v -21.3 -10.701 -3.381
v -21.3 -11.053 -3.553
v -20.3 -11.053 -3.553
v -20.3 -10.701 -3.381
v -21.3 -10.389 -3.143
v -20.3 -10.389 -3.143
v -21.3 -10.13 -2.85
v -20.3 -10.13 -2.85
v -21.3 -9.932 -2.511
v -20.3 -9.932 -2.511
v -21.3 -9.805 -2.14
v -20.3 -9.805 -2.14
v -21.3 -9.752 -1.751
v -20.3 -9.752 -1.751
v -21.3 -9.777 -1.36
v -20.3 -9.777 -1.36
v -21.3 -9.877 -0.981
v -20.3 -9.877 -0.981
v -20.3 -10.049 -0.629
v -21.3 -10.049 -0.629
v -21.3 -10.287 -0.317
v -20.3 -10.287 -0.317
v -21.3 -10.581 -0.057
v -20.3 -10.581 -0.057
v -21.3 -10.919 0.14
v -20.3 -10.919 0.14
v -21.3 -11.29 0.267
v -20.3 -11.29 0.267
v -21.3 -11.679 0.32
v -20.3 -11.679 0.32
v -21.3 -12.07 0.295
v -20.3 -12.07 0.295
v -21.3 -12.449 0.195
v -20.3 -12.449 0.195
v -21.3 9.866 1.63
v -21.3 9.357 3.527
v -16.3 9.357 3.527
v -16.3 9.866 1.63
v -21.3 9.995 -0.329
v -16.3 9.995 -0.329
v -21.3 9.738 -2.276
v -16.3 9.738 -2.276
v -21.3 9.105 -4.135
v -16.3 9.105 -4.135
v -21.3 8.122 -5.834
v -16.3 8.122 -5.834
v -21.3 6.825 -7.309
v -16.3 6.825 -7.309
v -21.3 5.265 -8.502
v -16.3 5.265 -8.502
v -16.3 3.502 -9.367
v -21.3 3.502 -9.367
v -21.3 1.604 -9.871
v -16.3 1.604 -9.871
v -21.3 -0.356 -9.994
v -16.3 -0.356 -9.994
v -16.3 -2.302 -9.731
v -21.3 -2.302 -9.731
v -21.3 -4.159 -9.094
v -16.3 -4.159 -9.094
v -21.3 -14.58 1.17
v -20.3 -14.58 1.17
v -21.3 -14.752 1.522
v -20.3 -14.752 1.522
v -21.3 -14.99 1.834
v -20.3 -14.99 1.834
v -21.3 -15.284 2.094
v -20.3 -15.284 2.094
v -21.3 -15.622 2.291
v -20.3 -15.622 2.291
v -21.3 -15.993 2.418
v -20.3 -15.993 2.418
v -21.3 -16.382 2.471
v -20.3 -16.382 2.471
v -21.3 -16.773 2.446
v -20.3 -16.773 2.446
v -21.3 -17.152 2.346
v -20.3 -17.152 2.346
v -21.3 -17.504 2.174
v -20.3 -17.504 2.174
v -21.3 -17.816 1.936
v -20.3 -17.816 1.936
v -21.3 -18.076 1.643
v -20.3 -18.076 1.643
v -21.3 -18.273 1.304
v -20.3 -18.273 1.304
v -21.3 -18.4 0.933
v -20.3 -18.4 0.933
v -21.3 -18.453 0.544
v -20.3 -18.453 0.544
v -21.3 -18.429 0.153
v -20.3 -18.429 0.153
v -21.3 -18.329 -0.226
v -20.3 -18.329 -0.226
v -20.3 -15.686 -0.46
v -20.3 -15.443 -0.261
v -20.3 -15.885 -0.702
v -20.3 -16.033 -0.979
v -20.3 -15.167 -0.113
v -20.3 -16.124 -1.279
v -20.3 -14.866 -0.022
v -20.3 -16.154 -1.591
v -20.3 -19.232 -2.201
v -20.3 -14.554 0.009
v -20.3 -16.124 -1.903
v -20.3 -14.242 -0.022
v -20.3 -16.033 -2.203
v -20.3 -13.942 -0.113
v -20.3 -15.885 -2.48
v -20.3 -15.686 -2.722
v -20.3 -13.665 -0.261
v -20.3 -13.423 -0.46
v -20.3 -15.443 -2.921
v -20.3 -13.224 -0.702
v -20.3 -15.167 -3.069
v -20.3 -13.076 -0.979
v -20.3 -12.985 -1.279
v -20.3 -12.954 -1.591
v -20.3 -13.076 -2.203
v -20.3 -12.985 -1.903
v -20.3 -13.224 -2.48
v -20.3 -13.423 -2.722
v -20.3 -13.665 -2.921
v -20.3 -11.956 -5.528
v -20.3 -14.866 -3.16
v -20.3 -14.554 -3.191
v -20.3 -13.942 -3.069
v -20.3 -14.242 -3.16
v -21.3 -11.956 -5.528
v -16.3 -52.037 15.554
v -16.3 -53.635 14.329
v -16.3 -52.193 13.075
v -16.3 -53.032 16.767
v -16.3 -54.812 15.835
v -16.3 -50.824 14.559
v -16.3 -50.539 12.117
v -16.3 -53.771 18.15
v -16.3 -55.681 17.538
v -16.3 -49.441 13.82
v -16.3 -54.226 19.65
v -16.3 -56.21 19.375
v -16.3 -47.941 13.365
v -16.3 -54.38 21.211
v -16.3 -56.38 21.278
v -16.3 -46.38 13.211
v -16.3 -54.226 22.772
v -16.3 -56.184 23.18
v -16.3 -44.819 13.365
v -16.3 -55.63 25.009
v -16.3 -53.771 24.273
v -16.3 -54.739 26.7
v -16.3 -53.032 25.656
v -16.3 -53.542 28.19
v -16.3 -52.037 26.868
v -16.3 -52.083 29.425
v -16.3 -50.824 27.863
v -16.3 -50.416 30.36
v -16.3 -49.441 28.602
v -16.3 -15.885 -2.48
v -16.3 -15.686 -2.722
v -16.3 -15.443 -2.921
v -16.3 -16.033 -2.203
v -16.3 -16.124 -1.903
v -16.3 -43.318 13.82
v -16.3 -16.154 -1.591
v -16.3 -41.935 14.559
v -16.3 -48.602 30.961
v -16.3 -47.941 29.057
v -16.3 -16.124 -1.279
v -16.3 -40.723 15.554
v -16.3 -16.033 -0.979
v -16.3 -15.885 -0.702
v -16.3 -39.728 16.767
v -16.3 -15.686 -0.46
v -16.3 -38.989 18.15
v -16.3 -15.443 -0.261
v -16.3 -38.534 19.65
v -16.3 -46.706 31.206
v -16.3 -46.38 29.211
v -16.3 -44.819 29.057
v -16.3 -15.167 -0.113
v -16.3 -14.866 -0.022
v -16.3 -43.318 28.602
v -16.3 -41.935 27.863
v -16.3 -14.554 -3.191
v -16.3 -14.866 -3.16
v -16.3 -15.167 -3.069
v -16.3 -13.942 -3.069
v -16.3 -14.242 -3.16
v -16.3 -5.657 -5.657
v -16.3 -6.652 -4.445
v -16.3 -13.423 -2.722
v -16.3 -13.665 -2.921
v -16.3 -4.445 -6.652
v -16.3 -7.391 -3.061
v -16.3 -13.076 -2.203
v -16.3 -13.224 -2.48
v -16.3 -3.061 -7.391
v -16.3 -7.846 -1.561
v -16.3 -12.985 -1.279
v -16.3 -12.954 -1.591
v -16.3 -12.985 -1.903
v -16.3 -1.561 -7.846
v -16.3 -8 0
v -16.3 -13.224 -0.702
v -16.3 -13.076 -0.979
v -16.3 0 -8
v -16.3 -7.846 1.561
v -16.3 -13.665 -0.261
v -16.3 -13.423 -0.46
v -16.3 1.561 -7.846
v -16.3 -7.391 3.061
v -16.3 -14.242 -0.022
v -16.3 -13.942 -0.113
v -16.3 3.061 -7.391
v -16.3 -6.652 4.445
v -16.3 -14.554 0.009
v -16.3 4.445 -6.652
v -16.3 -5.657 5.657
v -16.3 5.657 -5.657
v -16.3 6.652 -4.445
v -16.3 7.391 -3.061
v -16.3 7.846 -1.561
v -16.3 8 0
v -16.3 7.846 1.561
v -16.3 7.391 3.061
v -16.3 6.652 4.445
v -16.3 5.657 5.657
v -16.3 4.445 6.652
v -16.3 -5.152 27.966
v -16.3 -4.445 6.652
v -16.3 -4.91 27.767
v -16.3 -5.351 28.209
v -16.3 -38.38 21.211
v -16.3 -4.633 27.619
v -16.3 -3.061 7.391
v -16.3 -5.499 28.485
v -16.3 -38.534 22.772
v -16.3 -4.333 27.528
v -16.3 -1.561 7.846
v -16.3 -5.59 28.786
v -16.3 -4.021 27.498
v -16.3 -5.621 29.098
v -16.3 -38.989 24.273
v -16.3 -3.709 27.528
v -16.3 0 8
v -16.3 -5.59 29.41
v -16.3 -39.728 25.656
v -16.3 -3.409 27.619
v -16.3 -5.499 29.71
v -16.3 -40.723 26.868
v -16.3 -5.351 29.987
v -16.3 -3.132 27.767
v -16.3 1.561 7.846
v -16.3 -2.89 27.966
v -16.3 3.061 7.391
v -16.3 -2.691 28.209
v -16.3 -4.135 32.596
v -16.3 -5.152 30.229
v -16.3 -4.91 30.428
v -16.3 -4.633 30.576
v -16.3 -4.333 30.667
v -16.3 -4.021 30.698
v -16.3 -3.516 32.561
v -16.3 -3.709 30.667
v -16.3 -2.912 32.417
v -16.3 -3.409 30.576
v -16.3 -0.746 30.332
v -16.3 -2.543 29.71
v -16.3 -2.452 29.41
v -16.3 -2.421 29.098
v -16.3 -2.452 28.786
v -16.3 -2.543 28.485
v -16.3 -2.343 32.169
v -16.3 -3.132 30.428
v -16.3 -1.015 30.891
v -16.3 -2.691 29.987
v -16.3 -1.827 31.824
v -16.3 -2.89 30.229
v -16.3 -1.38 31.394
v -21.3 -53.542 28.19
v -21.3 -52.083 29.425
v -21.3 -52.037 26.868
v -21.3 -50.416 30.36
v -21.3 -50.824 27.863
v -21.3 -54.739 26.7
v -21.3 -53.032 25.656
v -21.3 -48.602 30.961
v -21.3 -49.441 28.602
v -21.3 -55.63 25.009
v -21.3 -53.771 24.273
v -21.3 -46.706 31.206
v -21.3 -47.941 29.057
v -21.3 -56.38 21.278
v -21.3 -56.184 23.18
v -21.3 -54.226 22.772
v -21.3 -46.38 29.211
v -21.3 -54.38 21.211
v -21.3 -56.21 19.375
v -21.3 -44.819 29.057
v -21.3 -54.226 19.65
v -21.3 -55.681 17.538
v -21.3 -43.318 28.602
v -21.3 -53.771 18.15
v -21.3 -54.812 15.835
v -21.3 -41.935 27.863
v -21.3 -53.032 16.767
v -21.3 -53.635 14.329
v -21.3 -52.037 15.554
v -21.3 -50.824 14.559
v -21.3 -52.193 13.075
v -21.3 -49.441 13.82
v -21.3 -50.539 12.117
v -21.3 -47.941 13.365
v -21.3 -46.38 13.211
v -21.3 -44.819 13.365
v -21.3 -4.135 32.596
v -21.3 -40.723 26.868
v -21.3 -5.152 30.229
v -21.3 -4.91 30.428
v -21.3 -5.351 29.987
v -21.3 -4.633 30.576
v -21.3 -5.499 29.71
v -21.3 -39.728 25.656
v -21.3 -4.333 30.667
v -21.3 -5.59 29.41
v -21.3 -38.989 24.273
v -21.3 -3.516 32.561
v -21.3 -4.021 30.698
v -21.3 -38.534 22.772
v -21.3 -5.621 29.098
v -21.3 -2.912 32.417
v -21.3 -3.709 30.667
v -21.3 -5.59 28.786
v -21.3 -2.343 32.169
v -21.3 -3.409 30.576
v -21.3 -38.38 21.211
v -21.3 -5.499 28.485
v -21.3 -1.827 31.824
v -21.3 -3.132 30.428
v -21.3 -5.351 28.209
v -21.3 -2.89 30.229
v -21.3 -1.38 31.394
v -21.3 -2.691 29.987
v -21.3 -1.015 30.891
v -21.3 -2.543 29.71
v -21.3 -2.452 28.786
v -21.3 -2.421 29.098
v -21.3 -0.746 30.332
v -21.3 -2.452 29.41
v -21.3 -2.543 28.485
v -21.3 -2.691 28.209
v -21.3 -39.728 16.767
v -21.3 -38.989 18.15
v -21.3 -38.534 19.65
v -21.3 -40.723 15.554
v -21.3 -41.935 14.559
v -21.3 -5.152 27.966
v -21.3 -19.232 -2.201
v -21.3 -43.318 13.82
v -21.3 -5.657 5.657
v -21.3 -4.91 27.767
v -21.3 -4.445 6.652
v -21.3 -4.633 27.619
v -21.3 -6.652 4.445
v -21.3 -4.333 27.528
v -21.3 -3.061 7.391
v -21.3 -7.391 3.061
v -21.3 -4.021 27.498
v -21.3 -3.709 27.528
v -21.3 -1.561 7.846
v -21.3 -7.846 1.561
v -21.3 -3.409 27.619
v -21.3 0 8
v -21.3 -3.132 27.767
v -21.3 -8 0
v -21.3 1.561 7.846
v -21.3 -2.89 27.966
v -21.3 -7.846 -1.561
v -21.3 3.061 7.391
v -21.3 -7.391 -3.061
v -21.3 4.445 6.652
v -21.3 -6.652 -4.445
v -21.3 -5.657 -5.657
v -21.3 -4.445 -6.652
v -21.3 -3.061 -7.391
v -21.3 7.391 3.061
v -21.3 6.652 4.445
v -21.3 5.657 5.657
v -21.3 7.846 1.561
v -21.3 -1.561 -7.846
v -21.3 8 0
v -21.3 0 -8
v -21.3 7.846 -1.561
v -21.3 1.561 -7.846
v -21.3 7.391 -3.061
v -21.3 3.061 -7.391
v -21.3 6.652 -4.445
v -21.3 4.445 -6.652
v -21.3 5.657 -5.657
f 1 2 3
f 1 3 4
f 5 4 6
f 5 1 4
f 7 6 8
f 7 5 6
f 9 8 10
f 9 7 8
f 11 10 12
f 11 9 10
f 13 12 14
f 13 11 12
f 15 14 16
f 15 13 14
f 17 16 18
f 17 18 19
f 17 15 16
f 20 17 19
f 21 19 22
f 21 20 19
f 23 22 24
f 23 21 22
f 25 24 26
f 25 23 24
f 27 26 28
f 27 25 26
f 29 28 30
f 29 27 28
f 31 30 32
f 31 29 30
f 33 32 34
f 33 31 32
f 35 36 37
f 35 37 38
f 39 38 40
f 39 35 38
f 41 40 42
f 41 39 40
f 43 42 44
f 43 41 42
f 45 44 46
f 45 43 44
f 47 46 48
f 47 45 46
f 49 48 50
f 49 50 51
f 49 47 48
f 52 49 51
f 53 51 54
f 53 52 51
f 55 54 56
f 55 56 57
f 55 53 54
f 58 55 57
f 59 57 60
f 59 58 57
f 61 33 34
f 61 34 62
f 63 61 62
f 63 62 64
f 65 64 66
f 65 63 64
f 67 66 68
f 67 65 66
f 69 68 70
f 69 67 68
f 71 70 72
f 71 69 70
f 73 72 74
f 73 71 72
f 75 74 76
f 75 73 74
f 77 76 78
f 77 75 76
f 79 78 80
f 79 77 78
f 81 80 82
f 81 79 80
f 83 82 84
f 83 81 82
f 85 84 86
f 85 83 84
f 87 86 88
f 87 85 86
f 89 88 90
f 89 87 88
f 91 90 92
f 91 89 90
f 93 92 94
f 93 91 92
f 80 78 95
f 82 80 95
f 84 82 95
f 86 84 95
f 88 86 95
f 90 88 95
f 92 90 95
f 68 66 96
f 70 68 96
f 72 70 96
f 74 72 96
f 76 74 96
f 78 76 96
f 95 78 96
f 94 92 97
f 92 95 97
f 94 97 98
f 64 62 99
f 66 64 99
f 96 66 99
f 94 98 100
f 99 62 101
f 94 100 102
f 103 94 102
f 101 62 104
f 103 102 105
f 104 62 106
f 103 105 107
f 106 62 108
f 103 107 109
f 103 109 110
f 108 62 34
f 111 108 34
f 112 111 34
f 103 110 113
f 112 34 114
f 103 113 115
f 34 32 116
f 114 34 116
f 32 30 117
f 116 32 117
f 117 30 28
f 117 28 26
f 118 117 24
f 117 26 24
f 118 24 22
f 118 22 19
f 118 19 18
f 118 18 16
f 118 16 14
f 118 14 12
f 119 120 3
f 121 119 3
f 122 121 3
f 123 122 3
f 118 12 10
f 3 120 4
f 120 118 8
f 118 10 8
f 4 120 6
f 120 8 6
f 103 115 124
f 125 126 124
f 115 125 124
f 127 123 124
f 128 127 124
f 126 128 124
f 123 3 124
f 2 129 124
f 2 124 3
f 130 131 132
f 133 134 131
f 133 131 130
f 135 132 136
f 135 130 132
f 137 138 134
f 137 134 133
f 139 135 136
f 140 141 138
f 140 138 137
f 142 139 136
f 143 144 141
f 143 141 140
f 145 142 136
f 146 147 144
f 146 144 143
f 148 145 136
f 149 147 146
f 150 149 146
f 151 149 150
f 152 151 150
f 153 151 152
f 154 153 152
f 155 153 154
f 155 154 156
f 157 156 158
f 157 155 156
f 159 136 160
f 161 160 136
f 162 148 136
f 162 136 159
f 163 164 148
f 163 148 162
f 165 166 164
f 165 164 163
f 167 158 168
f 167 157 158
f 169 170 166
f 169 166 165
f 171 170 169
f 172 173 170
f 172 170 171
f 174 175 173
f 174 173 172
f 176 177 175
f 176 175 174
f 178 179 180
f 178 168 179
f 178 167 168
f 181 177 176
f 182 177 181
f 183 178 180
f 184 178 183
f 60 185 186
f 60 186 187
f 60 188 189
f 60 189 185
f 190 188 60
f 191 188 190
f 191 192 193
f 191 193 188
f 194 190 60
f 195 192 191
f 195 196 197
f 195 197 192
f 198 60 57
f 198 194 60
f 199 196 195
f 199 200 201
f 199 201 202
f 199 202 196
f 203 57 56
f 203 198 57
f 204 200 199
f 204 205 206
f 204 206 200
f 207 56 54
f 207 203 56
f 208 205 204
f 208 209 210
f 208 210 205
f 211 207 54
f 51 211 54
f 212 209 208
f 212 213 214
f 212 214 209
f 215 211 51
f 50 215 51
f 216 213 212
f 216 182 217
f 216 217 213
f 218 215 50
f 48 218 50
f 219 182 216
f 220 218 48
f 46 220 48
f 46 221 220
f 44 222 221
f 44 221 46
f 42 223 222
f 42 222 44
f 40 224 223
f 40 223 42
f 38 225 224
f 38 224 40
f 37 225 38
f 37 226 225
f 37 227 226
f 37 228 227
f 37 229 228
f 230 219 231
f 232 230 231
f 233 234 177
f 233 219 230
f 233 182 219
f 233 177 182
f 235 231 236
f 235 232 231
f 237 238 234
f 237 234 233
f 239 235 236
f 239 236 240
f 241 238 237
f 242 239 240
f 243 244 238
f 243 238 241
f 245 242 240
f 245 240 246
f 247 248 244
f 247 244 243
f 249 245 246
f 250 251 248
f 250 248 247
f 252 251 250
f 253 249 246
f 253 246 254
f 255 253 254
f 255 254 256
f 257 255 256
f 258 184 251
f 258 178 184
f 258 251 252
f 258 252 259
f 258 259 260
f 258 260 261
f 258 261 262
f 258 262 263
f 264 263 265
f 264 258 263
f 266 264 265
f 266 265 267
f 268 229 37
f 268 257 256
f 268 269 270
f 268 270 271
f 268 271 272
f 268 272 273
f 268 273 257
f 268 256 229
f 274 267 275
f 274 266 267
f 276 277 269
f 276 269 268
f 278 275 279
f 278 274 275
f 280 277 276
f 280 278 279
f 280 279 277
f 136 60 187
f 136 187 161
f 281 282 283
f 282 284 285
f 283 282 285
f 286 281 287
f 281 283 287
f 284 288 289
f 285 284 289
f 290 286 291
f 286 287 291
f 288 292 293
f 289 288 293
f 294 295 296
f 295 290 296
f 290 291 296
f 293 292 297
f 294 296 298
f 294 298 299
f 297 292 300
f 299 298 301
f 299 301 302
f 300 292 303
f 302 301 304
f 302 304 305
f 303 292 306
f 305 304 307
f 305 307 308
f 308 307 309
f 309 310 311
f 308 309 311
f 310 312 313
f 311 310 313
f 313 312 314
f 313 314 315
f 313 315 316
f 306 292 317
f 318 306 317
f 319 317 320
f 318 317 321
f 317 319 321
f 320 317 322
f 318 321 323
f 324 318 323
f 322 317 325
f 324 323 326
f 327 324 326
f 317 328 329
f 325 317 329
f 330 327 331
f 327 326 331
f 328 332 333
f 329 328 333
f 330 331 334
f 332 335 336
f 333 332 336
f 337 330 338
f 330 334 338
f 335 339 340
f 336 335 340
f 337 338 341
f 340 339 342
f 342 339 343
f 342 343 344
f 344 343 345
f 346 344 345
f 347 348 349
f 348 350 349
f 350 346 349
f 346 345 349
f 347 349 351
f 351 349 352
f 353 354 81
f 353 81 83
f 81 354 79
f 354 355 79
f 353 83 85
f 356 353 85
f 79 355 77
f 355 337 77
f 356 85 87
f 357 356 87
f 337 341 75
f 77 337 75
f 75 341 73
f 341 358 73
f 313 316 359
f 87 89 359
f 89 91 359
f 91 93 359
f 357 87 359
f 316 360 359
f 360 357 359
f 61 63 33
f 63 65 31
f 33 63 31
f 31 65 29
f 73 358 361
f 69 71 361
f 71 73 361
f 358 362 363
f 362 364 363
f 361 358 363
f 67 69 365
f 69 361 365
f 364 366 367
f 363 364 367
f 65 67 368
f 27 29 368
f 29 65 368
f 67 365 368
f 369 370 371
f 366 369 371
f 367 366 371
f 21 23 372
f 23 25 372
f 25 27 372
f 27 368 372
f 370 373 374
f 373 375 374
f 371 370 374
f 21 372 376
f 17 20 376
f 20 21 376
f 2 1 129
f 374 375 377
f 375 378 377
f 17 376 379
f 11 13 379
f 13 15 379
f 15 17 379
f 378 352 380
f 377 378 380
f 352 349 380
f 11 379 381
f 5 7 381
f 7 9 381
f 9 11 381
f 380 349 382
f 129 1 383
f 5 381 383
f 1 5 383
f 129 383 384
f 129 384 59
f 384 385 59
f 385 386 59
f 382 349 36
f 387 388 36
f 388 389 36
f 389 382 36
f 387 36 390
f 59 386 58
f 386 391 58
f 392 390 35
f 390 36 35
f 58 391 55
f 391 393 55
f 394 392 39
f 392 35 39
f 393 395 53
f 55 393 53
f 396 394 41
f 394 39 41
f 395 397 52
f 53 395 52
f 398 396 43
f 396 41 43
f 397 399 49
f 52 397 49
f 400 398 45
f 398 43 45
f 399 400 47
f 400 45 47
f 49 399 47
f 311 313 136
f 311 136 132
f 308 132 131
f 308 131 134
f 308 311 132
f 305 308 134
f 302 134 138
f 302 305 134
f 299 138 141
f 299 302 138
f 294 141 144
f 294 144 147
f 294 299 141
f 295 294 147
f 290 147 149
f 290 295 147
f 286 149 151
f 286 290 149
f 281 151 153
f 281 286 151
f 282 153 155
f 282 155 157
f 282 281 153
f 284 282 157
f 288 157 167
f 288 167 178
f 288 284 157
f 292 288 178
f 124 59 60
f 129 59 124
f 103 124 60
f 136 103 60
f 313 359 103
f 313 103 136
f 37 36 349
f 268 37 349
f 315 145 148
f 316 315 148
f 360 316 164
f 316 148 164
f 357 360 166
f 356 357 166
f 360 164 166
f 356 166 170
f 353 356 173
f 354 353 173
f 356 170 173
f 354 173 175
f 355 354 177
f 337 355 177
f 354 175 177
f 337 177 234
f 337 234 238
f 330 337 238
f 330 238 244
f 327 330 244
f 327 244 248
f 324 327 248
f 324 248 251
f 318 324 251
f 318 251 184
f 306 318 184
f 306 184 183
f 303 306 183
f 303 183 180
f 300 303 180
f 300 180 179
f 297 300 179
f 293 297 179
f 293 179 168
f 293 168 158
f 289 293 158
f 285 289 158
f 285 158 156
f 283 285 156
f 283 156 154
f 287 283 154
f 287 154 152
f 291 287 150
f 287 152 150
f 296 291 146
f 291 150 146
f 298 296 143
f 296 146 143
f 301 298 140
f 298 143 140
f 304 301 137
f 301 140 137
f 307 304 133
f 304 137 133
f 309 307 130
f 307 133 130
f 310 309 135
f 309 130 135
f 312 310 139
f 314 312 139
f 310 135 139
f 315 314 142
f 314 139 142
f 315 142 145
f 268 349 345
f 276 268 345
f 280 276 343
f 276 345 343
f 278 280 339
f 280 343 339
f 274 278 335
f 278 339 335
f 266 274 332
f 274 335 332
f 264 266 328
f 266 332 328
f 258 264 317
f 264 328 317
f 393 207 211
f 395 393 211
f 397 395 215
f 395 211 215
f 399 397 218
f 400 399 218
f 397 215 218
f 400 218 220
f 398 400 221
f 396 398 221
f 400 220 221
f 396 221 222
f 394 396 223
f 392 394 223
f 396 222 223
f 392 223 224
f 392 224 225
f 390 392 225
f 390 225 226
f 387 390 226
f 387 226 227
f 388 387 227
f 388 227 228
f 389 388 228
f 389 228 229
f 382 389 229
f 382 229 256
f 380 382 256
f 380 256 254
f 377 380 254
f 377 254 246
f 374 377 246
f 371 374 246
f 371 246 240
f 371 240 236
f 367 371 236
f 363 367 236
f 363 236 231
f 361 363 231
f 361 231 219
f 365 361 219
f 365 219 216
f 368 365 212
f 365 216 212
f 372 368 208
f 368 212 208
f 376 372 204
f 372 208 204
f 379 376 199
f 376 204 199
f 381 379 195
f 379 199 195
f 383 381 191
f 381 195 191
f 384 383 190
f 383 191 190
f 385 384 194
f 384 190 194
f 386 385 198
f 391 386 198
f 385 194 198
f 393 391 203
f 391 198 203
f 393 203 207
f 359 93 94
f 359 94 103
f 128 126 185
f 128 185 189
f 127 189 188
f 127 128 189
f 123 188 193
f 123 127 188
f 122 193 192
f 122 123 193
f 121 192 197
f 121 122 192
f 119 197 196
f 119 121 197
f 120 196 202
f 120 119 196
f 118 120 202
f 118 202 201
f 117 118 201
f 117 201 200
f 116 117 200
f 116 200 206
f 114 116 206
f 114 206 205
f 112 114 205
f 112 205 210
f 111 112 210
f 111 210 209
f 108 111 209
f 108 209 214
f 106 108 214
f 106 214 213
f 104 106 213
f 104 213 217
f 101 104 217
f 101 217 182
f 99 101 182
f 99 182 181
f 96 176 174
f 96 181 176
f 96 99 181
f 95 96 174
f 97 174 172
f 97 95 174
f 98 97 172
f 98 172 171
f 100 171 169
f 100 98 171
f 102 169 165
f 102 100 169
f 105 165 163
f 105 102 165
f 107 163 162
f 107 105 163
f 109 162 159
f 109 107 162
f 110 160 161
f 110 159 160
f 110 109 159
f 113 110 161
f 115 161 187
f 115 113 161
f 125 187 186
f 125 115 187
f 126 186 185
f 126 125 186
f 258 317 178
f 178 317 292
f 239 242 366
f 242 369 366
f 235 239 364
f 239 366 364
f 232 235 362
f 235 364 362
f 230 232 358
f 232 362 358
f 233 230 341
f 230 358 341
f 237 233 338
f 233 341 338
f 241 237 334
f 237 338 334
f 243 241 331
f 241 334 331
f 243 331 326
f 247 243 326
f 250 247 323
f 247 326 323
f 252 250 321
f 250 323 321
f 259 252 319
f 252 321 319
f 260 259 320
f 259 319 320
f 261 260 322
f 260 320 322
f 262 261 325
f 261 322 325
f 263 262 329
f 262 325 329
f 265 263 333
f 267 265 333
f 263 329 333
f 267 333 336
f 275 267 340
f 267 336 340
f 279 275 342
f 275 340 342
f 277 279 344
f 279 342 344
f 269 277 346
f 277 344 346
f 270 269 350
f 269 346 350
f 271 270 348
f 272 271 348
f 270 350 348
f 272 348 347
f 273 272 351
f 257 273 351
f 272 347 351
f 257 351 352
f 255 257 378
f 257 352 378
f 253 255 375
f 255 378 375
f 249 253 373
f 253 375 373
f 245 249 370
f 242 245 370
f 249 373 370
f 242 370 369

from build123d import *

# Parameters (mm, degrees)
BOSS_EXTRUDE1_START  = -11.3
SKETCH2_R            = 8
BOSS_EXTRUDE1_DEPTH  = 5
BOSS_EXTRUDE2_START  = -11.3
BOSS_EXTRUDE2_DEPTH  = 5
CUT_EXTRUDE2_START   = -11.3
CUT_EXTRUDE2_DEPTH   = 1
M3_CLEARANCE_HOLE1_D = 3.2
M3_CLEARANCE_HOLE2_D = 3.2


# Read off the part's stored shape, not the designer's step: Intersect1
with BuildPart() as part:
    # Sketch2 → Boss-Extrude1 (new body)
    with BuildSketch(Plane(origin=(0, 0, 0), x_dir=(0, 0, -1), z_dir=(1, 0, 0)).offset(BOSS_EXTRUDE1_START)):
        with BuildLine():
            Line((9.0940801, -4.15905123), (-12.117081171, -50.538859741))
            ThreePointArc((-12.117081171, -50.538859741), (-25.370212501, -55.473888611), (-30.305241372, -42.220757281))
            Line((-30.305241372, -42.220757281), (-9.0940801, 4.15905123))
            ThreePointArc((-9.0940801, 4.15905123), (4.15905123, 9.0940801), (9.0940801, -4.15905123))
        make_face()
        with Locations((-21.211161271, -46.379808511)):
            Circle(SKETCH2_R, mode=Mode.SUBTRACT)
        Circle(SKETCH2_R, mode=Mode.SUBTRACT)
    boss_extrude1 = extrude(amount=-BOSS_EXTRUDE1_DEPTH)

    # Sketch2<3> → Boss-Extrude2 (add)
    with BuildSketch(Plane(origin=(0, 0, 0), x_dir=(0, 0, -1), z_dir=(1, 0, 0)).offset(BOSS_EXTRUDE2_START)):
        with BuildLine():
            ThreePointArc((-9.0940801, 4.15905123), (-6.824825213, 7.309019141), (-3.526945256, 9.357385167))
            Line((-3.526945256, 9.357385167), (-30.332118628, -0.745905163))
            ThreePointArc((-30.332118628, -0.745905163), (-32.00821012, -2.077061023), (-32.595823612, -4.135208005))
            Line((-32.595823612, -4.135208005), (-31.205835053, -46.706145748))
            ThreePointArc((-31.205835053, -46.706145748), (-31.015487287, -44.411257932), (-30.305241372, -42.220757281))
            Line((-30.305241372, -42.220757281), (-9.0940801, 4.15905123))
        make_face()
    boss_extrude2 = extrude(amount=-BOSS_EXTRUDE2_DEPTH)

    # Sketch2<6> → Cut-Extrude2 (cut)
    with BuildSketch(Plane(origin=(0, 0, 0), x_dir=(0, 0, -1), z_dir=(1, 0, 0)).offset(CUT_EXTRUDE2_START)):
        with BuildLine():
            Line((2.200817213, -19.231691933), (5.528058196, -11.956427853))
            Line((5.528058196, -11.956427853), (3.553212429, -11.053259569))
            ThreePointArc((3.553212429, -11.053259569), (0.981018146, -9.876902238), (-0.195339185, -12.449096521))
            Line((-0.195339185, -12.449096521), (-1.169865506, -14.579972035))
            ThreePointArc((-1.169865506, -14.579972035), (-2.346222837, -17.152166318), (0.225971446, -18.328523649))
            Line((0.225971446, -18.328523649), (2.200817213, -19.231691933))
        make_face()
    cut_extrude2 = extrude(amount=-CUT_EXTRUDE2_DEPTH, mode=Mode.SUBTRACT)

    # M3 Clearance Hole1 (through all)
    with Locations(Plane(origin=(-11.3, 0, 0), x_dir=(0, 0, 1), z_dir=(1, 0, 0))):
        with Locations((29.097687789, 4.020989972)):
            m3_clearance_hole1 = Hole(M3_CLEARANCE_HOLE1_D / 2)

    # M3 Clearance Hole2 (through all)
    with Locations(Plane.ZY.offset(16.3)):
        with Locations((-1.590917679, -14.554297085)):
            m3_clearance_hole2 = Hole(M3_CLEARANCE_HOLE2_D / 2)

    # Mirror2: Boss-Extrude1, Boss-Extrude2, Cut-Extrude2, M3 Clearance Hole1, M3 Clearance Hole2 across plane
    add(boss_extrude1.mirror(Plane.ZY.offset(16.3)))
    add(boss_extrude2.mirror(Plane.ZY.offset(16.3)))
    add(cut_extrude2.mirror(Plane.ZY.offset(16.3)), mode=Mode.SUBTRACT)
    add(m3_clearance_hole1.mirror(Plane.ZY.offset(16.3)), mode=Mode.SUBTRACT)
    add(m3_clearance_hole2.mirror(Plane.ZY.offset(16.3)), mode=Mode.SUBTRACT)


with BuildPart() as body_2:
    # Intersect1: the piece on the far side of the plane
    add(part.part)
    split(bisect_by=Plane.YZ.offset(-16.3), keep=Keep.BOTTOM)


with BuildPart() as part_1:
    add(part.part)

    # Intersect1
    split(bisect_by=Plane.YZ.offset(-16.3), keep=Keep.TOP)


solid = body_2.part
